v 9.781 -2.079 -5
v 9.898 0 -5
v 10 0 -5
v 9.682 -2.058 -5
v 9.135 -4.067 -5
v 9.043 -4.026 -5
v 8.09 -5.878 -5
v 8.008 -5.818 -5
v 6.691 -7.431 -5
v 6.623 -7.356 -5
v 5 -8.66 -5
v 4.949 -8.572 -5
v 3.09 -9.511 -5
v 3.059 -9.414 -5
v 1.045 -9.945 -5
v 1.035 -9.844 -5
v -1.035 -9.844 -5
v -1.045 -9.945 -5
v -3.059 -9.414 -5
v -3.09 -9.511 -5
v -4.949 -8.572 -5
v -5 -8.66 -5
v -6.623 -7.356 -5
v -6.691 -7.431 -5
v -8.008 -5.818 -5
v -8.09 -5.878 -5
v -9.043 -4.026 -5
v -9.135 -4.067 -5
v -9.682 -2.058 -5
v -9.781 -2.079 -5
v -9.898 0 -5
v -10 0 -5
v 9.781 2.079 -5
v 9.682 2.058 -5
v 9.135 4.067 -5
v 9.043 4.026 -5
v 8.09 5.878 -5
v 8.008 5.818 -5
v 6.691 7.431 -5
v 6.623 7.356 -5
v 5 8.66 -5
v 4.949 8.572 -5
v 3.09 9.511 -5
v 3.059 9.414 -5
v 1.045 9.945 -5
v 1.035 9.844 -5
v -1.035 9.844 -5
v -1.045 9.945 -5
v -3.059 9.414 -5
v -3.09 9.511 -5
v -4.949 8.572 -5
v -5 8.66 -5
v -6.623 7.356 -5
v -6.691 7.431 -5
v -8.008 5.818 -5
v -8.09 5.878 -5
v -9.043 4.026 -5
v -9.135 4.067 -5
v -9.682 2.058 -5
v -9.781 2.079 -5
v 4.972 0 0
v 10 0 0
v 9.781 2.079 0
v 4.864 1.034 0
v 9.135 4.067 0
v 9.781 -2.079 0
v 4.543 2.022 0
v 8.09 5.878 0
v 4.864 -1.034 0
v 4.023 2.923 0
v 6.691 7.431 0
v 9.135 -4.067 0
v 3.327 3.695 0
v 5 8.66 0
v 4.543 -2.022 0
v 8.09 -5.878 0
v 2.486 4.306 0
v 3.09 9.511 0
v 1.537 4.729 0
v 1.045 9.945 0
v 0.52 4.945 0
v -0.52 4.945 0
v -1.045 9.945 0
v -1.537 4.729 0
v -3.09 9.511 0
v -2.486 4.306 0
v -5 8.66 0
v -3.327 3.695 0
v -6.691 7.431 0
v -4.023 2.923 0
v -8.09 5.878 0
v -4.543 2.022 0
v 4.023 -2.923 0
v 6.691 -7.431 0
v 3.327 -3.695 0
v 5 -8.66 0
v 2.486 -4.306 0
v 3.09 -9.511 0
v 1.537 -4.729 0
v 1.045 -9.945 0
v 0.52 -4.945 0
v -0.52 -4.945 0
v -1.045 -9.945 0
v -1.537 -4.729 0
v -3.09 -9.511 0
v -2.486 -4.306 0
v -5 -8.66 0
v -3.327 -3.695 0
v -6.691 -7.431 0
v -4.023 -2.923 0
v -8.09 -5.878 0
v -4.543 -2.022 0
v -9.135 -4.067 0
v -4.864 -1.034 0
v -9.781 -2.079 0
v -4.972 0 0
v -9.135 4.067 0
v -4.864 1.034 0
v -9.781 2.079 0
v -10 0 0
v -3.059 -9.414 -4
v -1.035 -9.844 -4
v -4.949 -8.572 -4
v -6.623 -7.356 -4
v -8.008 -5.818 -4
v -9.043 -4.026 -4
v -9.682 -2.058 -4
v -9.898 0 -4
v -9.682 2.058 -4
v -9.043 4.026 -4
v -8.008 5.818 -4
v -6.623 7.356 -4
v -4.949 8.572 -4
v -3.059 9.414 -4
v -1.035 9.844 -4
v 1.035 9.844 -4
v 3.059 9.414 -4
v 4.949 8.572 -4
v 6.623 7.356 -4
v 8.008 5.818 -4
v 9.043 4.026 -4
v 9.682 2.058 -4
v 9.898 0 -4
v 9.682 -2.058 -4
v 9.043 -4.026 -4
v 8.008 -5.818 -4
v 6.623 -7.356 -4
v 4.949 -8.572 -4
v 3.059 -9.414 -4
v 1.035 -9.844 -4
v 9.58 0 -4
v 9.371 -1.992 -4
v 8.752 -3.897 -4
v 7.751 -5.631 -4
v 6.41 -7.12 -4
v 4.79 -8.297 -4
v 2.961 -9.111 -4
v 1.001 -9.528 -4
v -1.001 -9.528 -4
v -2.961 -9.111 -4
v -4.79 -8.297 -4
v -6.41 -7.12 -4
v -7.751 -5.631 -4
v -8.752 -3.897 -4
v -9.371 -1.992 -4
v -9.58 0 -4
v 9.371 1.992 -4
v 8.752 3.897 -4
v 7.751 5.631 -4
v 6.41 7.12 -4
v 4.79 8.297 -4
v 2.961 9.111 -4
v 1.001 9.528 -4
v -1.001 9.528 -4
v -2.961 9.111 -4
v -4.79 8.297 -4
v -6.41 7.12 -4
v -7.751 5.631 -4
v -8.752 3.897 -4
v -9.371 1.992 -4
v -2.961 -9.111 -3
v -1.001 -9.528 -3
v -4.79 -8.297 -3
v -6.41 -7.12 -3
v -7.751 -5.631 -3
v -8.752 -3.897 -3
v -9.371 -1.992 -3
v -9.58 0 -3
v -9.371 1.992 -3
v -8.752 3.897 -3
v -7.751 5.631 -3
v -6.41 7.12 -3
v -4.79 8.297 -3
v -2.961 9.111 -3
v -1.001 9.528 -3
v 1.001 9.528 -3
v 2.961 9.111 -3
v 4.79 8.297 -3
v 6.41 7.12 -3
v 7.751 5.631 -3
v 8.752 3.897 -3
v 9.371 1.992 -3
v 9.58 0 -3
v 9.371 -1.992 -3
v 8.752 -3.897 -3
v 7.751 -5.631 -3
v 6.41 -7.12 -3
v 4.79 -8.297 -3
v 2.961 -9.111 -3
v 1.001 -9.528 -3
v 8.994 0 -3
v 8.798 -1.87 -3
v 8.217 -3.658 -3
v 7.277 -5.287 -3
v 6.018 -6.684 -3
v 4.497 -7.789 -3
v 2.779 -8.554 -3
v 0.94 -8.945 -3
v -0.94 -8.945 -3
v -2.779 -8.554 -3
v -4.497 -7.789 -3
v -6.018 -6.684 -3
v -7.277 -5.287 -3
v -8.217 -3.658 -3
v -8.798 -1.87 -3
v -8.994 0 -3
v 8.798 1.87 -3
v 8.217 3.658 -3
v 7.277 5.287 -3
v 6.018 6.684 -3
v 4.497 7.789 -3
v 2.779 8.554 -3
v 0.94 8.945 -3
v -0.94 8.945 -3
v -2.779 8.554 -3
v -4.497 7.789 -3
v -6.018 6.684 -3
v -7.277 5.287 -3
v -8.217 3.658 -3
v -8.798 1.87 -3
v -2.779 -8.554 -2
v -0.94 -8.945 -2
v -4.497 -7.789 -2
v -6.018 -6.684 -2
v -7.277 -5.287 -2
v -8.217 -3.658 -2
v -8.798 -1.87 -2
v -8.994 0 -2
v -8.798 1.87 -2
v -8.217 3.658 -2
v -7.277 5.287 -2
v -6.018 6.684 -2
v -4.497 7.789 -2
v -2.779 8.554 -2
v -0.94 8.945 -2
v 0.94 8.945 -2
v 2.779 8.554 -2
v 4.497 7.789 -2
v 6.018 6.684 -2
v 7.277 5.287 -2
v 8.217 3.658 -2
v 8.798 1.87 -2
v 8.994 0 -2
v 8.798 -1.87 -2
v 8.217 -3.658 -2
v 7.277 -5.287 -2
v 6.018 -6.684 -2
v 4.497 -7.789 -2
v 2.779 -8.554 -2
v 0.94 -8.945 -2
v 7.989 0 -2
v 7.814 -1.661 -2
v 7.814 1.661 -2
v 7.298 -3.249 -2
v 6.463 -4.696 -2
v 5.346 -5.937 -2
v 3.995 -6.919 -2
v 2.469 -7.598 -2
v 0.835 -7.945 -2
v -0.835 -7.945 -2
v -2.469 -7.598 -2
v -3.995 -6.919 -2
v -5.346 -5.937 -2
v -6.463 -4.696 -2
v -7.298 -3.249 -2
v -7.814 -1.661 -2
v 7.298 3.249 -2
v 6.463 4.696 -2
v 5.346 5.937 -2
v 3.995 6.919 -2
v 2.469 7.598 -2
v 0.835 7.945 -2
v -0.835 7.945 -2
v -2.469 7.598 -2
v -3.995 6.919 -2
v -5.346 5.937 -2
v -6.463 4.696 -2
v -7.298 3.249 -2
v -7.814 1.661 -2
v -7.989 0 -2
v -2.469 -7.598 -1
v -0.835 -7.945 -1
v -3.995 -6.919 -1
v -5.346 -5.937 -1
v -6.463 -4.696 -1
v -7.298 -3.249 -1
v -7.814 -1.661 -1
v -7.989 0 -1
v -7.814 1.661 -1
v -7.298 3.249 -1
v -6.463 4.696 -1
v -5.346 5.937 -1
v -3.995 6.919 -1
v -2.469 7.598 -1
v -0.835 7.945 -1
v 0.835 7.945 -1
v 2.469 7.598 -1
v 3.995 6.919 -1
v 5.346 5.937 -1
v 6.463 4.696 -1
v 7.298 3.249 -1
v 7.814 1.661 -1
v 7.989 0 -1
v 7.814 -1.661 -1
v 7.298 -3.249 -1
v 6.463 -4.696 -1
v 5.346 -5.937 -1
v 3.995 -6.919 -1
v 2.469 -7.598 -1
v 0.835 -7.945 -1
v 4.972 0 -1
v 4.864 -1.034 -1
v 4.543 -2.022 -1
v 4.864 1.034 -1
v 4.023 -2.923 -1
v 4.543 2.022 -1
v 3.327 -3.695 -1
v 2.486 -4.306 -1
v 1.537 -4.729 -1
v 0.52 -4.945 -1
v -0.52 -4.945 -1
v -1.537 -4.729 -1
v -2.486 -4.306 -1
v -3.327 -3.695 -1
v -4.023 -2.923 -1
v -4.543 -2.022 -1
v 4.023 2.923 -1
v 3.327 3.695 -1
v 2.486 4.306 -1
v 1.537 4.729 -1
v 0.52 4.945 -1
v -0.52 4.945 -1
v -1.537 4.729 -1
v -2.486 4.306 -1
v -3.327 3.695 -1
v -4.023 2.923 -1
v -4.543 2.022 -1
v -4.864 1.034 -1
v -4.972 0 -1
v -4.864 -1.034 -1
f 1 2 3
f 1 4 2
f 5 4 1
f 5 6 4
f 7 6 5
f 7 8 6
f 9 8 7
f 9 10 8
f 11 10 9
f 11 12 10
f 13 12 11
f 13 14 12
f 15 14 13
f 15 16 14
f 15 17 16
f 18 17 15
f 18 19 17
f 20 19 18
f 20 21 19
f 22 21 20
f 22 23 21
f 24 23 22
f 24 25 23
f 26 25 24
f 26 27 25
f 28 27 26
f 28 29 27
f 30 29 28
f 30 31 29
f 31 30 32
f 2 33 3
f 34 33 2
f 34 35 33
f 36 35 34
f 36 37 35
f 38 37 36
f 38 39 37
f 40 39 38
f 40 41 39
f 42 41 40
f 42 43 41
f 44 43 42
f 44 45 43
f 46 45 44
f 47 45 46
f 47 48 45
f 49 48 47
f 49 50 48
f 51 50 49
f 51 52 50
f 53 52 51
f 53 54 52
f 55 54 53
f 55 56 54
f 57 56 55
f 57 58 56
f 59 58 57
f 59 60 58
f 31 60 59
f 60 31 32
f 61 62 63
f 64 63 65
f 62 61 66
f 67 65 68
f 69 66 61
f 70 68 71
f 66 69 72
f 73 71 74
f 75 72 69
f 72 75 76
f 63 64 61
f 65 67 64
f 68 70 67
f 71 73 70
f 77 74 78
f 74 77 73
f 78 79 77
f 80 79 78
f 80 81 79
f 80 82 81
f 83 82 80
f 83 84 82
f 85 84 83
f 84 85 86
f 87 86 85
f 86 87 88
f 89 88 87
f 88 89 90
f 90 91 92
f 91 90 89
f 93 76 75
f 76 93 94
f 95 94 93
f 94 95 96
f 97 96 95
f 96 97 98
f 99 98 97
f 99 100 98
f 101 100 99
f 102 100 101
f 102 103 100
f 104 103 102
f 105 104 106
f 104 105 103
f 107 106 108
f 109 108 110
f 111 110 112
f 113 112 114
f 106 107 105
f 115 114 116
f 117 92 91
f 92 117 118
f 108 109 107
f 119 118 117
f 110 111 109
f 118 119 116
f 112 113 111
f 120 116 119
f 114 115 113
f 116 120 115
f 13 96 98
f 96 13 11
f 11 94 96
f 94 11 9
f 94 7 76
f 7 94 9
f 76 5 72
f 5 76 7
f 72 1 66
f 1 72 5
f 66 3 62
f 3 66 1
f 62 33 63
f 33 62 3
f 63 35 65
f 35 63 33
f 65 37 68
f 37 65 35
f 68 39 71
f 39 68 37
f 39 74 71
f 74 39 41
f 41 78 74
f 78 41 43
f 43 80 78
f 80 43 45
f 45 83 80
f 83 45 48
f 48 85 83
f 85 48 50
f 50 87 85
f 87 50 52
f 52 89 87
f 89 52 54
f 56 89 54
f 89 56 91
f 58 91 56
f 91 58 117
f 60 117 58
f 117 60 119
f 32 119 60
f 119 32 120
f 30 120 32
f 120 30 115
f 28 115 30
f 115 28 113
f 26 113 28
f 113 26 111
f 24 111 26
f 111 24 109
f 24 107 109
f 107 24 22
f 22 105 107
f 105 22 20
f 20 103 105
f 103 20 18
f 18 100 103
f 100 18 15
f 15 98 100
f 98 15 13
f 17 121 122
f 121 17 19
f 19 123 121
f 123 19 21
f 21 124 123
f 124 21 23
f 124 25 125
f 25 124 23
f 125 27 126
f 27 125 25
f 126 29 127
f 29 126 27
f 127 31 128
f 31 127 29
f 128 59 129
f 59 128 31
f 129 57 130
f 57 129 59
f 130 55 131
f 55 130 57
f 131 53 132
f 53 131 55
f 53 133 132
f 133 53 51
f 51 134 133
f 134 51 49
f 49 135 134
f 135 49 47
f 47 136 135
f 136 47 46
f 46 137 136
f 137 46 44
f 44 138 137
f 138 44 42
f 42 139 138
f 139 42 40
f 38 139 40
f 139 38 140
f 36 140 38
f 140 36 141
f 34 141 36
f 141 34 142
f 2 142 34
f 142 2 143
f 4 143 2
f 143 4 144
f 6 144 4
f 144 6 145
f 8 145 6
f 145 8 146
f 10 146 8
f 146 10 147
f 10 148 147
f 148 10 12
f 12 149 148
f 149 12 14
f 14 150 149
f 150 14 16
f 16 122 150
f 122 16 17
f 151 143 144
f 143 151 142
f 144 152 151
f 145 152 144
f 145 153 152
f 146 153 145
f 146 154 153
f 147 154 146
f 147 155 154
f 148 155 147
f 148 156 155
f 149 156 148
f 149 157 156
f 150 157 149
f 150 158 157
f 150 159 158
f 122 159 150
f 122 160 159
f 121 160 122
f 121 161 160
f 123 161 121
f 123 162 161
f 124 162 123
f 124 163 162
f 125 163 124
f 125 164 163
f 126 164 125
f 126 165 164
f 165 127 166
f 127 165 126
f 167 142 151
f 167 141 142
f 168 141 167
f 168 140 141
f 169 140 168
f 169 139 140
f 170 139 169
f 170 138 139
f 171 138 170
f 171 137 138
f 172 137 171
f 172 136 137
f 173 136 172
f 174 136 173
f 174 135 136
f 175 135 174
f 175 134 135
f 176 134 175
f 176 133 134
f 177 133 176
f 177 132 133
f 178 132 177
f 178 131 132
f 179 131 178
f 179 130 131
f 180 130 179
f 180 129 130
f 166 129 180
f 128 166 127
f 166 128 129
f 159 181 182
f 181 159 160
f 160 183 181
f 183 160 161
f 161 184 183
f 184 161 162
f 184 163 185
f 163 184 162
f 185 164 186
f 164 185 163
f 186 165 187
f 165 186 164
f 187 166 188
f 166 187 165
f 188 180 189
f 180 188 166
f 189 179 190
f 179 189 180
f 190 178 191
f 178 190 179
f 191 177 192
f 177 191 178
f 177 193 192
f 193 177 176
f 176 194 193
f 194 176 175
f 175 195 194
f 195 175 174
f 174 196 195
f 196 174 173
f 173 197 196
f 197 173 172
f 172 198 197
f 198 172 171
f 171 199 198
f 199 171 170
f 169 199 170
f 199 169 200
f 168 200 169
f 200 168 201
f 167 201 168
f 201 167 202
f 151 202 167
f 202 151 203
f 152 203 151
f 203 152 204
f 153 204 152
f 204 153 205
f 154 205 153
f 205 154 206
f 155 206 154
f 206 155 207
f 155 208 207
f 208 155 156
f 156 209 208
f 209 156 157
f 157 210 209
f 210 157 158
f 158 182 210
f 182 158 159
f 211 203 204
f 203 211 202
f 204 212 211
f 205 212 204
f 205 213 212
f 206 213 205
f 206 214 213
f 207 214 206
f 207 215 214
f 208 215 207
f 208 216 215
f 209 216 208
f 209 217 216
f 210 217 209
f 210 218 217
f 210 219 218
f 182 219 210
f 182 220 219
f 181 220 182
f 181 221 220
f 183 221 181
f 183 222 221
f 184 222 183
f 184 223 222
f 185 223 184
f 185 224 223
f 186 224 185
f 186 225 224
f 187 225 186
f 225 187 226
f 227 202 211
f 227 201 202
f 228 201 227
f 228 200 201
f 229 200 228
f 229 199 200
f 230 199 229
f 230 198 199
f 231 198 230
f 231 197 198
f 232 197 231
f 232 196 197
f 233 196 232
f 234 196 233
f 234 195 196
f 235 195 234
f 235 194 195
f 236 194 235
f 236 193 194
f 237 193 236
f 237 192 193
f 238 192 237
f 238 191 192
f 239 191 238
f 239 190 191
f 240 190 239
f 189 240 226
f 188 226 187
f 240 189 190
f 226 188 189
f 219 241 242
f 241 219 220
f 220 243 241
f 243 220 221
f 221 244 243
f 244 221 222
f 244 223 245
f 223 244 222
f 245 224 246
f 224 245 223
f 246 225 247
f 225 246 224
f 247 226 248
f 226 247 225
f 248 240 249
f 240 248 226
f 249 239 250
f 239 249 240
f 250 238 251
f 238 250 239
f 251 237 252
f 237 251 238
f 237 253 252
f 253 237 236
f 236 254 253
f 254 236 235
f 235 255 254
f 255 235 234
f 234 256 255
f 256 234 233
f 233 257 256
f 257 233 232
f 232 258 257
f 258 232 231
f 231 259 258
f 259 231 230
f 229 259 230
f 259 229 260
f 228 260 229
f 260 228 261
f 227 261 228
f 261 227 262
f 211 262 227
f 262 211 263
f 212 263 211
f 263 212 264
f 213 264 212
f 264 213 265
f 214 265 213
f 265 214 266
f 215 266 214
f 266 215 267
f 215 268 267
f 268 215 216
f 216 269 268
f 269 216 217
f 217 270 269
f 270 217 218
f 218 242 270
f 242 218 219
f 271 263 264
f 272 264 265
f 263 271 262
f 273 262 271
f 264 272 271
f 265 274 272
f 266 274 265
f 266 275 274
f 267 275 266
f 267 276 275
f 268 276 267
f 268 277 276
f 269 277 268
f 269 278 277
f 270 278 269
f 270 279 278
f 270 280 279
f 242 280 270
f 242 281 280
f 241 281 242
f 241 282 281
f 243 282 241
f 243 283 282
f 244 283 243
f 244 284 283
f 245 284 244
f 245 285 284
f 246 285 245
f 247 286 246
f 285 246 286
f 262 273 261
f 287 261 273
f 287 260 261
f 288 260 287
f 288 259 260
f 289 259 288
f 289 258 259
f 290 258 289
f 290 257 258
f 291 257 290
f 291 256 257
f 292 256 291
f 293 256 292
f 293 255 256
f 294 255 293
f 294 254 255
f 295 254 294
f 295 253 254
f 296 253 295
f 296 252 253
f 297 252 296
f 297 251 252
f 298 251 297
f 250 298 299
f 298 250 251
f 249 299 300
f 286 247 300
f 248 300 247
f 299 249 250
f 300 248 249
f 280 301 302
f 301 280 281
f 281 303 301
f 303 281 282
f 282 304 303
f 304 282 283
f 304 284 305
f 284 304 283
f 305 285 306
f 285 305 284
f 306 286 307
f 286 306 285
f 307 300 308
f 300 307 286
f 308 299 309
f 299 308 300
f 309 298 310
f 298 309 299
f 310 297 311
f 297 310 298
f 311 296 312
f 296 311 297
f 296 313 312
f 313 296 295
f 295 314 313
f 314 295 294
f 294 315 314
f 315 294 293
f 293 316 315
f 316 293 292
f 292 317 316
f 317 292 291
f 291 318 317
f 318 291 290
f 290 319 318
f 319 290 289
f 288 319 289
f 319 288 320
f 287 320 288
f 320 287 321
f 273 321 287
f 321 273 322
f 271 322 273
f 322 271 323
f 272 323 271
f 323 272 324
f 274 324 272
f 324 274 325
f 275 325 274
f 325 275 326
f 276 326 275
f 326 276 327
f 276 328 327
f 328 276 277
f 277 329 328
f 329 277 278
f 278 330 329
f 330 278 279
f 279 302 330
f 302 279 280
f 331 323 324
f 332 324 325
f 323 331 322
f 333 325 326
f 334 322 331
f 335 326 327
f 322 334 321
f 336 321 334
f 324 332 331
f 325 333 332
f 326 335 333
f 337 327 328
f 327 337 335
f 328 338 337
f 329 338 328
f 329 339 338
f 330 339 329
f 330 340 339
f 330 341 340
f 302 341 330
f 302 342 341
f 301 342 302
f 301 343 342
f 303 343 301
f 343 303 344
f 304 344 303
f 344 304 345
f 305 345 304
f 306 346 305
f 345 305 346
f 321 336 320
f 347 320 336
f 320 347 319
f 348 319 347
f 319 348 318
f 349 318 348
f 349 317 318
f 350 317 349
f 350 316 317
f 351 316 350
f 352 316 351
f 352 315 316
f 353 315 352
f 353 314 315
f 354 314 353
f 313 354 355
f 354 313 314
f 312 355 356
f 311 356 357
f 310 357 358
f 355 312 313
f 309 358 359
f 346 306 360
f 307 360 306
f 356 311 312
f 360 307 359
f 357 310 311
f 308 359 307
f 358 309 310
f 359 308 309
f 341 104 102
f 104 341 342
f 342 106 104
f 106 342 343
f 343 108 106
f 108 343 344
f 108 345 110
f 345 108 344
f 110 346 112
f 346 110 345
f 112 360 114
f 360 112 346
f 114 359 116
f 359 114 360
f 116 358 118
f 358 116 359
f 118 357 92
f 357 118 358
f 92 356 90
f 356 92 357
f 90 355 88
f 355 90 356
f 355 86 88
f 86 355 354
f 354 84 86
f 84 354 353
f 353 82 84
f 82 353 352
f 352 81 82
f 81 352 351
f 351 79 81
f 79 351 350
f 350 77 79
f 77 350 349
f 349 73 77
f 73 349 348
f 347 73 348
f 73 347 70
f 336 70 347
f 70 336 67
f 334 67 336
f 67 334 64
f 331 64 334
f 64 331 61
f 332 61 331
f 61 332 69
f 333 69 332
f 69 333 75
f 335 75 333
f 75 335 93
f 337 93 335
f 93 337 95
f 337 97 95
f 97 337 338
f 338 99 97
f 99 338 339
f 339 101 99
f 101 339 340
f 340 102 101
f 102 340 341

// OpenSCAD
union() {
    union() {
        translate(v=[0, 0, -5]) {
            linear_extrude(height=5) {
                difference() {
                    offset(r=0) {
                        circle(r=10);
                    };
                    offset(r=-0.10102051443364402) {
                        circle(r=10);
                    };
                };
            };
        };
        translate(v=[0, 0, -4]) {
            linear_extrude(height=4) {
                difference() {
                    offset(r=-0.10102051443364402) {
                        circle(r=10);
                    };
                    offset(r=-0.41742430504416006) {
                        circle(r=10);
                    };
                };
            };
        };
        translate(v=[0, 0, -3]) {
            linear_extrude(height=3) {
                difference() {
                    offset(r=-0.41742430504416006) {
                        circle(r=10);
                    };
                    offset(r=-0.9999999999999998) {
                        circle(r=10);
                    };
                };
            };
        };
        translate(v=[0, 0, -2]) {
            linear_extrude(height=2) {
                difference() {
                    offset(r=-0.9999999999999998) {
                        circle(r=10);
                    };
                    offset(r=-2.000000000000001) {
                        circle(r=10);
                    };
                };
            };
        };
        translate(v=[0, 0, -1]) {
            linear_extrude(height=1) {
                difference() {
                    offset(r=-2.000000000000001) {
                        circle(r=10);
                    };
                    offset(r=-5) {
                        circle(r=10);
                    };
                };
            };
        };
    };
    %difference() {
        translate(v=[0, 0, -2.5]) {
            cube(size=[25, 25, 5], center=true);
        };
        cylinder(r=10, h=20, center=true);
    };
};
